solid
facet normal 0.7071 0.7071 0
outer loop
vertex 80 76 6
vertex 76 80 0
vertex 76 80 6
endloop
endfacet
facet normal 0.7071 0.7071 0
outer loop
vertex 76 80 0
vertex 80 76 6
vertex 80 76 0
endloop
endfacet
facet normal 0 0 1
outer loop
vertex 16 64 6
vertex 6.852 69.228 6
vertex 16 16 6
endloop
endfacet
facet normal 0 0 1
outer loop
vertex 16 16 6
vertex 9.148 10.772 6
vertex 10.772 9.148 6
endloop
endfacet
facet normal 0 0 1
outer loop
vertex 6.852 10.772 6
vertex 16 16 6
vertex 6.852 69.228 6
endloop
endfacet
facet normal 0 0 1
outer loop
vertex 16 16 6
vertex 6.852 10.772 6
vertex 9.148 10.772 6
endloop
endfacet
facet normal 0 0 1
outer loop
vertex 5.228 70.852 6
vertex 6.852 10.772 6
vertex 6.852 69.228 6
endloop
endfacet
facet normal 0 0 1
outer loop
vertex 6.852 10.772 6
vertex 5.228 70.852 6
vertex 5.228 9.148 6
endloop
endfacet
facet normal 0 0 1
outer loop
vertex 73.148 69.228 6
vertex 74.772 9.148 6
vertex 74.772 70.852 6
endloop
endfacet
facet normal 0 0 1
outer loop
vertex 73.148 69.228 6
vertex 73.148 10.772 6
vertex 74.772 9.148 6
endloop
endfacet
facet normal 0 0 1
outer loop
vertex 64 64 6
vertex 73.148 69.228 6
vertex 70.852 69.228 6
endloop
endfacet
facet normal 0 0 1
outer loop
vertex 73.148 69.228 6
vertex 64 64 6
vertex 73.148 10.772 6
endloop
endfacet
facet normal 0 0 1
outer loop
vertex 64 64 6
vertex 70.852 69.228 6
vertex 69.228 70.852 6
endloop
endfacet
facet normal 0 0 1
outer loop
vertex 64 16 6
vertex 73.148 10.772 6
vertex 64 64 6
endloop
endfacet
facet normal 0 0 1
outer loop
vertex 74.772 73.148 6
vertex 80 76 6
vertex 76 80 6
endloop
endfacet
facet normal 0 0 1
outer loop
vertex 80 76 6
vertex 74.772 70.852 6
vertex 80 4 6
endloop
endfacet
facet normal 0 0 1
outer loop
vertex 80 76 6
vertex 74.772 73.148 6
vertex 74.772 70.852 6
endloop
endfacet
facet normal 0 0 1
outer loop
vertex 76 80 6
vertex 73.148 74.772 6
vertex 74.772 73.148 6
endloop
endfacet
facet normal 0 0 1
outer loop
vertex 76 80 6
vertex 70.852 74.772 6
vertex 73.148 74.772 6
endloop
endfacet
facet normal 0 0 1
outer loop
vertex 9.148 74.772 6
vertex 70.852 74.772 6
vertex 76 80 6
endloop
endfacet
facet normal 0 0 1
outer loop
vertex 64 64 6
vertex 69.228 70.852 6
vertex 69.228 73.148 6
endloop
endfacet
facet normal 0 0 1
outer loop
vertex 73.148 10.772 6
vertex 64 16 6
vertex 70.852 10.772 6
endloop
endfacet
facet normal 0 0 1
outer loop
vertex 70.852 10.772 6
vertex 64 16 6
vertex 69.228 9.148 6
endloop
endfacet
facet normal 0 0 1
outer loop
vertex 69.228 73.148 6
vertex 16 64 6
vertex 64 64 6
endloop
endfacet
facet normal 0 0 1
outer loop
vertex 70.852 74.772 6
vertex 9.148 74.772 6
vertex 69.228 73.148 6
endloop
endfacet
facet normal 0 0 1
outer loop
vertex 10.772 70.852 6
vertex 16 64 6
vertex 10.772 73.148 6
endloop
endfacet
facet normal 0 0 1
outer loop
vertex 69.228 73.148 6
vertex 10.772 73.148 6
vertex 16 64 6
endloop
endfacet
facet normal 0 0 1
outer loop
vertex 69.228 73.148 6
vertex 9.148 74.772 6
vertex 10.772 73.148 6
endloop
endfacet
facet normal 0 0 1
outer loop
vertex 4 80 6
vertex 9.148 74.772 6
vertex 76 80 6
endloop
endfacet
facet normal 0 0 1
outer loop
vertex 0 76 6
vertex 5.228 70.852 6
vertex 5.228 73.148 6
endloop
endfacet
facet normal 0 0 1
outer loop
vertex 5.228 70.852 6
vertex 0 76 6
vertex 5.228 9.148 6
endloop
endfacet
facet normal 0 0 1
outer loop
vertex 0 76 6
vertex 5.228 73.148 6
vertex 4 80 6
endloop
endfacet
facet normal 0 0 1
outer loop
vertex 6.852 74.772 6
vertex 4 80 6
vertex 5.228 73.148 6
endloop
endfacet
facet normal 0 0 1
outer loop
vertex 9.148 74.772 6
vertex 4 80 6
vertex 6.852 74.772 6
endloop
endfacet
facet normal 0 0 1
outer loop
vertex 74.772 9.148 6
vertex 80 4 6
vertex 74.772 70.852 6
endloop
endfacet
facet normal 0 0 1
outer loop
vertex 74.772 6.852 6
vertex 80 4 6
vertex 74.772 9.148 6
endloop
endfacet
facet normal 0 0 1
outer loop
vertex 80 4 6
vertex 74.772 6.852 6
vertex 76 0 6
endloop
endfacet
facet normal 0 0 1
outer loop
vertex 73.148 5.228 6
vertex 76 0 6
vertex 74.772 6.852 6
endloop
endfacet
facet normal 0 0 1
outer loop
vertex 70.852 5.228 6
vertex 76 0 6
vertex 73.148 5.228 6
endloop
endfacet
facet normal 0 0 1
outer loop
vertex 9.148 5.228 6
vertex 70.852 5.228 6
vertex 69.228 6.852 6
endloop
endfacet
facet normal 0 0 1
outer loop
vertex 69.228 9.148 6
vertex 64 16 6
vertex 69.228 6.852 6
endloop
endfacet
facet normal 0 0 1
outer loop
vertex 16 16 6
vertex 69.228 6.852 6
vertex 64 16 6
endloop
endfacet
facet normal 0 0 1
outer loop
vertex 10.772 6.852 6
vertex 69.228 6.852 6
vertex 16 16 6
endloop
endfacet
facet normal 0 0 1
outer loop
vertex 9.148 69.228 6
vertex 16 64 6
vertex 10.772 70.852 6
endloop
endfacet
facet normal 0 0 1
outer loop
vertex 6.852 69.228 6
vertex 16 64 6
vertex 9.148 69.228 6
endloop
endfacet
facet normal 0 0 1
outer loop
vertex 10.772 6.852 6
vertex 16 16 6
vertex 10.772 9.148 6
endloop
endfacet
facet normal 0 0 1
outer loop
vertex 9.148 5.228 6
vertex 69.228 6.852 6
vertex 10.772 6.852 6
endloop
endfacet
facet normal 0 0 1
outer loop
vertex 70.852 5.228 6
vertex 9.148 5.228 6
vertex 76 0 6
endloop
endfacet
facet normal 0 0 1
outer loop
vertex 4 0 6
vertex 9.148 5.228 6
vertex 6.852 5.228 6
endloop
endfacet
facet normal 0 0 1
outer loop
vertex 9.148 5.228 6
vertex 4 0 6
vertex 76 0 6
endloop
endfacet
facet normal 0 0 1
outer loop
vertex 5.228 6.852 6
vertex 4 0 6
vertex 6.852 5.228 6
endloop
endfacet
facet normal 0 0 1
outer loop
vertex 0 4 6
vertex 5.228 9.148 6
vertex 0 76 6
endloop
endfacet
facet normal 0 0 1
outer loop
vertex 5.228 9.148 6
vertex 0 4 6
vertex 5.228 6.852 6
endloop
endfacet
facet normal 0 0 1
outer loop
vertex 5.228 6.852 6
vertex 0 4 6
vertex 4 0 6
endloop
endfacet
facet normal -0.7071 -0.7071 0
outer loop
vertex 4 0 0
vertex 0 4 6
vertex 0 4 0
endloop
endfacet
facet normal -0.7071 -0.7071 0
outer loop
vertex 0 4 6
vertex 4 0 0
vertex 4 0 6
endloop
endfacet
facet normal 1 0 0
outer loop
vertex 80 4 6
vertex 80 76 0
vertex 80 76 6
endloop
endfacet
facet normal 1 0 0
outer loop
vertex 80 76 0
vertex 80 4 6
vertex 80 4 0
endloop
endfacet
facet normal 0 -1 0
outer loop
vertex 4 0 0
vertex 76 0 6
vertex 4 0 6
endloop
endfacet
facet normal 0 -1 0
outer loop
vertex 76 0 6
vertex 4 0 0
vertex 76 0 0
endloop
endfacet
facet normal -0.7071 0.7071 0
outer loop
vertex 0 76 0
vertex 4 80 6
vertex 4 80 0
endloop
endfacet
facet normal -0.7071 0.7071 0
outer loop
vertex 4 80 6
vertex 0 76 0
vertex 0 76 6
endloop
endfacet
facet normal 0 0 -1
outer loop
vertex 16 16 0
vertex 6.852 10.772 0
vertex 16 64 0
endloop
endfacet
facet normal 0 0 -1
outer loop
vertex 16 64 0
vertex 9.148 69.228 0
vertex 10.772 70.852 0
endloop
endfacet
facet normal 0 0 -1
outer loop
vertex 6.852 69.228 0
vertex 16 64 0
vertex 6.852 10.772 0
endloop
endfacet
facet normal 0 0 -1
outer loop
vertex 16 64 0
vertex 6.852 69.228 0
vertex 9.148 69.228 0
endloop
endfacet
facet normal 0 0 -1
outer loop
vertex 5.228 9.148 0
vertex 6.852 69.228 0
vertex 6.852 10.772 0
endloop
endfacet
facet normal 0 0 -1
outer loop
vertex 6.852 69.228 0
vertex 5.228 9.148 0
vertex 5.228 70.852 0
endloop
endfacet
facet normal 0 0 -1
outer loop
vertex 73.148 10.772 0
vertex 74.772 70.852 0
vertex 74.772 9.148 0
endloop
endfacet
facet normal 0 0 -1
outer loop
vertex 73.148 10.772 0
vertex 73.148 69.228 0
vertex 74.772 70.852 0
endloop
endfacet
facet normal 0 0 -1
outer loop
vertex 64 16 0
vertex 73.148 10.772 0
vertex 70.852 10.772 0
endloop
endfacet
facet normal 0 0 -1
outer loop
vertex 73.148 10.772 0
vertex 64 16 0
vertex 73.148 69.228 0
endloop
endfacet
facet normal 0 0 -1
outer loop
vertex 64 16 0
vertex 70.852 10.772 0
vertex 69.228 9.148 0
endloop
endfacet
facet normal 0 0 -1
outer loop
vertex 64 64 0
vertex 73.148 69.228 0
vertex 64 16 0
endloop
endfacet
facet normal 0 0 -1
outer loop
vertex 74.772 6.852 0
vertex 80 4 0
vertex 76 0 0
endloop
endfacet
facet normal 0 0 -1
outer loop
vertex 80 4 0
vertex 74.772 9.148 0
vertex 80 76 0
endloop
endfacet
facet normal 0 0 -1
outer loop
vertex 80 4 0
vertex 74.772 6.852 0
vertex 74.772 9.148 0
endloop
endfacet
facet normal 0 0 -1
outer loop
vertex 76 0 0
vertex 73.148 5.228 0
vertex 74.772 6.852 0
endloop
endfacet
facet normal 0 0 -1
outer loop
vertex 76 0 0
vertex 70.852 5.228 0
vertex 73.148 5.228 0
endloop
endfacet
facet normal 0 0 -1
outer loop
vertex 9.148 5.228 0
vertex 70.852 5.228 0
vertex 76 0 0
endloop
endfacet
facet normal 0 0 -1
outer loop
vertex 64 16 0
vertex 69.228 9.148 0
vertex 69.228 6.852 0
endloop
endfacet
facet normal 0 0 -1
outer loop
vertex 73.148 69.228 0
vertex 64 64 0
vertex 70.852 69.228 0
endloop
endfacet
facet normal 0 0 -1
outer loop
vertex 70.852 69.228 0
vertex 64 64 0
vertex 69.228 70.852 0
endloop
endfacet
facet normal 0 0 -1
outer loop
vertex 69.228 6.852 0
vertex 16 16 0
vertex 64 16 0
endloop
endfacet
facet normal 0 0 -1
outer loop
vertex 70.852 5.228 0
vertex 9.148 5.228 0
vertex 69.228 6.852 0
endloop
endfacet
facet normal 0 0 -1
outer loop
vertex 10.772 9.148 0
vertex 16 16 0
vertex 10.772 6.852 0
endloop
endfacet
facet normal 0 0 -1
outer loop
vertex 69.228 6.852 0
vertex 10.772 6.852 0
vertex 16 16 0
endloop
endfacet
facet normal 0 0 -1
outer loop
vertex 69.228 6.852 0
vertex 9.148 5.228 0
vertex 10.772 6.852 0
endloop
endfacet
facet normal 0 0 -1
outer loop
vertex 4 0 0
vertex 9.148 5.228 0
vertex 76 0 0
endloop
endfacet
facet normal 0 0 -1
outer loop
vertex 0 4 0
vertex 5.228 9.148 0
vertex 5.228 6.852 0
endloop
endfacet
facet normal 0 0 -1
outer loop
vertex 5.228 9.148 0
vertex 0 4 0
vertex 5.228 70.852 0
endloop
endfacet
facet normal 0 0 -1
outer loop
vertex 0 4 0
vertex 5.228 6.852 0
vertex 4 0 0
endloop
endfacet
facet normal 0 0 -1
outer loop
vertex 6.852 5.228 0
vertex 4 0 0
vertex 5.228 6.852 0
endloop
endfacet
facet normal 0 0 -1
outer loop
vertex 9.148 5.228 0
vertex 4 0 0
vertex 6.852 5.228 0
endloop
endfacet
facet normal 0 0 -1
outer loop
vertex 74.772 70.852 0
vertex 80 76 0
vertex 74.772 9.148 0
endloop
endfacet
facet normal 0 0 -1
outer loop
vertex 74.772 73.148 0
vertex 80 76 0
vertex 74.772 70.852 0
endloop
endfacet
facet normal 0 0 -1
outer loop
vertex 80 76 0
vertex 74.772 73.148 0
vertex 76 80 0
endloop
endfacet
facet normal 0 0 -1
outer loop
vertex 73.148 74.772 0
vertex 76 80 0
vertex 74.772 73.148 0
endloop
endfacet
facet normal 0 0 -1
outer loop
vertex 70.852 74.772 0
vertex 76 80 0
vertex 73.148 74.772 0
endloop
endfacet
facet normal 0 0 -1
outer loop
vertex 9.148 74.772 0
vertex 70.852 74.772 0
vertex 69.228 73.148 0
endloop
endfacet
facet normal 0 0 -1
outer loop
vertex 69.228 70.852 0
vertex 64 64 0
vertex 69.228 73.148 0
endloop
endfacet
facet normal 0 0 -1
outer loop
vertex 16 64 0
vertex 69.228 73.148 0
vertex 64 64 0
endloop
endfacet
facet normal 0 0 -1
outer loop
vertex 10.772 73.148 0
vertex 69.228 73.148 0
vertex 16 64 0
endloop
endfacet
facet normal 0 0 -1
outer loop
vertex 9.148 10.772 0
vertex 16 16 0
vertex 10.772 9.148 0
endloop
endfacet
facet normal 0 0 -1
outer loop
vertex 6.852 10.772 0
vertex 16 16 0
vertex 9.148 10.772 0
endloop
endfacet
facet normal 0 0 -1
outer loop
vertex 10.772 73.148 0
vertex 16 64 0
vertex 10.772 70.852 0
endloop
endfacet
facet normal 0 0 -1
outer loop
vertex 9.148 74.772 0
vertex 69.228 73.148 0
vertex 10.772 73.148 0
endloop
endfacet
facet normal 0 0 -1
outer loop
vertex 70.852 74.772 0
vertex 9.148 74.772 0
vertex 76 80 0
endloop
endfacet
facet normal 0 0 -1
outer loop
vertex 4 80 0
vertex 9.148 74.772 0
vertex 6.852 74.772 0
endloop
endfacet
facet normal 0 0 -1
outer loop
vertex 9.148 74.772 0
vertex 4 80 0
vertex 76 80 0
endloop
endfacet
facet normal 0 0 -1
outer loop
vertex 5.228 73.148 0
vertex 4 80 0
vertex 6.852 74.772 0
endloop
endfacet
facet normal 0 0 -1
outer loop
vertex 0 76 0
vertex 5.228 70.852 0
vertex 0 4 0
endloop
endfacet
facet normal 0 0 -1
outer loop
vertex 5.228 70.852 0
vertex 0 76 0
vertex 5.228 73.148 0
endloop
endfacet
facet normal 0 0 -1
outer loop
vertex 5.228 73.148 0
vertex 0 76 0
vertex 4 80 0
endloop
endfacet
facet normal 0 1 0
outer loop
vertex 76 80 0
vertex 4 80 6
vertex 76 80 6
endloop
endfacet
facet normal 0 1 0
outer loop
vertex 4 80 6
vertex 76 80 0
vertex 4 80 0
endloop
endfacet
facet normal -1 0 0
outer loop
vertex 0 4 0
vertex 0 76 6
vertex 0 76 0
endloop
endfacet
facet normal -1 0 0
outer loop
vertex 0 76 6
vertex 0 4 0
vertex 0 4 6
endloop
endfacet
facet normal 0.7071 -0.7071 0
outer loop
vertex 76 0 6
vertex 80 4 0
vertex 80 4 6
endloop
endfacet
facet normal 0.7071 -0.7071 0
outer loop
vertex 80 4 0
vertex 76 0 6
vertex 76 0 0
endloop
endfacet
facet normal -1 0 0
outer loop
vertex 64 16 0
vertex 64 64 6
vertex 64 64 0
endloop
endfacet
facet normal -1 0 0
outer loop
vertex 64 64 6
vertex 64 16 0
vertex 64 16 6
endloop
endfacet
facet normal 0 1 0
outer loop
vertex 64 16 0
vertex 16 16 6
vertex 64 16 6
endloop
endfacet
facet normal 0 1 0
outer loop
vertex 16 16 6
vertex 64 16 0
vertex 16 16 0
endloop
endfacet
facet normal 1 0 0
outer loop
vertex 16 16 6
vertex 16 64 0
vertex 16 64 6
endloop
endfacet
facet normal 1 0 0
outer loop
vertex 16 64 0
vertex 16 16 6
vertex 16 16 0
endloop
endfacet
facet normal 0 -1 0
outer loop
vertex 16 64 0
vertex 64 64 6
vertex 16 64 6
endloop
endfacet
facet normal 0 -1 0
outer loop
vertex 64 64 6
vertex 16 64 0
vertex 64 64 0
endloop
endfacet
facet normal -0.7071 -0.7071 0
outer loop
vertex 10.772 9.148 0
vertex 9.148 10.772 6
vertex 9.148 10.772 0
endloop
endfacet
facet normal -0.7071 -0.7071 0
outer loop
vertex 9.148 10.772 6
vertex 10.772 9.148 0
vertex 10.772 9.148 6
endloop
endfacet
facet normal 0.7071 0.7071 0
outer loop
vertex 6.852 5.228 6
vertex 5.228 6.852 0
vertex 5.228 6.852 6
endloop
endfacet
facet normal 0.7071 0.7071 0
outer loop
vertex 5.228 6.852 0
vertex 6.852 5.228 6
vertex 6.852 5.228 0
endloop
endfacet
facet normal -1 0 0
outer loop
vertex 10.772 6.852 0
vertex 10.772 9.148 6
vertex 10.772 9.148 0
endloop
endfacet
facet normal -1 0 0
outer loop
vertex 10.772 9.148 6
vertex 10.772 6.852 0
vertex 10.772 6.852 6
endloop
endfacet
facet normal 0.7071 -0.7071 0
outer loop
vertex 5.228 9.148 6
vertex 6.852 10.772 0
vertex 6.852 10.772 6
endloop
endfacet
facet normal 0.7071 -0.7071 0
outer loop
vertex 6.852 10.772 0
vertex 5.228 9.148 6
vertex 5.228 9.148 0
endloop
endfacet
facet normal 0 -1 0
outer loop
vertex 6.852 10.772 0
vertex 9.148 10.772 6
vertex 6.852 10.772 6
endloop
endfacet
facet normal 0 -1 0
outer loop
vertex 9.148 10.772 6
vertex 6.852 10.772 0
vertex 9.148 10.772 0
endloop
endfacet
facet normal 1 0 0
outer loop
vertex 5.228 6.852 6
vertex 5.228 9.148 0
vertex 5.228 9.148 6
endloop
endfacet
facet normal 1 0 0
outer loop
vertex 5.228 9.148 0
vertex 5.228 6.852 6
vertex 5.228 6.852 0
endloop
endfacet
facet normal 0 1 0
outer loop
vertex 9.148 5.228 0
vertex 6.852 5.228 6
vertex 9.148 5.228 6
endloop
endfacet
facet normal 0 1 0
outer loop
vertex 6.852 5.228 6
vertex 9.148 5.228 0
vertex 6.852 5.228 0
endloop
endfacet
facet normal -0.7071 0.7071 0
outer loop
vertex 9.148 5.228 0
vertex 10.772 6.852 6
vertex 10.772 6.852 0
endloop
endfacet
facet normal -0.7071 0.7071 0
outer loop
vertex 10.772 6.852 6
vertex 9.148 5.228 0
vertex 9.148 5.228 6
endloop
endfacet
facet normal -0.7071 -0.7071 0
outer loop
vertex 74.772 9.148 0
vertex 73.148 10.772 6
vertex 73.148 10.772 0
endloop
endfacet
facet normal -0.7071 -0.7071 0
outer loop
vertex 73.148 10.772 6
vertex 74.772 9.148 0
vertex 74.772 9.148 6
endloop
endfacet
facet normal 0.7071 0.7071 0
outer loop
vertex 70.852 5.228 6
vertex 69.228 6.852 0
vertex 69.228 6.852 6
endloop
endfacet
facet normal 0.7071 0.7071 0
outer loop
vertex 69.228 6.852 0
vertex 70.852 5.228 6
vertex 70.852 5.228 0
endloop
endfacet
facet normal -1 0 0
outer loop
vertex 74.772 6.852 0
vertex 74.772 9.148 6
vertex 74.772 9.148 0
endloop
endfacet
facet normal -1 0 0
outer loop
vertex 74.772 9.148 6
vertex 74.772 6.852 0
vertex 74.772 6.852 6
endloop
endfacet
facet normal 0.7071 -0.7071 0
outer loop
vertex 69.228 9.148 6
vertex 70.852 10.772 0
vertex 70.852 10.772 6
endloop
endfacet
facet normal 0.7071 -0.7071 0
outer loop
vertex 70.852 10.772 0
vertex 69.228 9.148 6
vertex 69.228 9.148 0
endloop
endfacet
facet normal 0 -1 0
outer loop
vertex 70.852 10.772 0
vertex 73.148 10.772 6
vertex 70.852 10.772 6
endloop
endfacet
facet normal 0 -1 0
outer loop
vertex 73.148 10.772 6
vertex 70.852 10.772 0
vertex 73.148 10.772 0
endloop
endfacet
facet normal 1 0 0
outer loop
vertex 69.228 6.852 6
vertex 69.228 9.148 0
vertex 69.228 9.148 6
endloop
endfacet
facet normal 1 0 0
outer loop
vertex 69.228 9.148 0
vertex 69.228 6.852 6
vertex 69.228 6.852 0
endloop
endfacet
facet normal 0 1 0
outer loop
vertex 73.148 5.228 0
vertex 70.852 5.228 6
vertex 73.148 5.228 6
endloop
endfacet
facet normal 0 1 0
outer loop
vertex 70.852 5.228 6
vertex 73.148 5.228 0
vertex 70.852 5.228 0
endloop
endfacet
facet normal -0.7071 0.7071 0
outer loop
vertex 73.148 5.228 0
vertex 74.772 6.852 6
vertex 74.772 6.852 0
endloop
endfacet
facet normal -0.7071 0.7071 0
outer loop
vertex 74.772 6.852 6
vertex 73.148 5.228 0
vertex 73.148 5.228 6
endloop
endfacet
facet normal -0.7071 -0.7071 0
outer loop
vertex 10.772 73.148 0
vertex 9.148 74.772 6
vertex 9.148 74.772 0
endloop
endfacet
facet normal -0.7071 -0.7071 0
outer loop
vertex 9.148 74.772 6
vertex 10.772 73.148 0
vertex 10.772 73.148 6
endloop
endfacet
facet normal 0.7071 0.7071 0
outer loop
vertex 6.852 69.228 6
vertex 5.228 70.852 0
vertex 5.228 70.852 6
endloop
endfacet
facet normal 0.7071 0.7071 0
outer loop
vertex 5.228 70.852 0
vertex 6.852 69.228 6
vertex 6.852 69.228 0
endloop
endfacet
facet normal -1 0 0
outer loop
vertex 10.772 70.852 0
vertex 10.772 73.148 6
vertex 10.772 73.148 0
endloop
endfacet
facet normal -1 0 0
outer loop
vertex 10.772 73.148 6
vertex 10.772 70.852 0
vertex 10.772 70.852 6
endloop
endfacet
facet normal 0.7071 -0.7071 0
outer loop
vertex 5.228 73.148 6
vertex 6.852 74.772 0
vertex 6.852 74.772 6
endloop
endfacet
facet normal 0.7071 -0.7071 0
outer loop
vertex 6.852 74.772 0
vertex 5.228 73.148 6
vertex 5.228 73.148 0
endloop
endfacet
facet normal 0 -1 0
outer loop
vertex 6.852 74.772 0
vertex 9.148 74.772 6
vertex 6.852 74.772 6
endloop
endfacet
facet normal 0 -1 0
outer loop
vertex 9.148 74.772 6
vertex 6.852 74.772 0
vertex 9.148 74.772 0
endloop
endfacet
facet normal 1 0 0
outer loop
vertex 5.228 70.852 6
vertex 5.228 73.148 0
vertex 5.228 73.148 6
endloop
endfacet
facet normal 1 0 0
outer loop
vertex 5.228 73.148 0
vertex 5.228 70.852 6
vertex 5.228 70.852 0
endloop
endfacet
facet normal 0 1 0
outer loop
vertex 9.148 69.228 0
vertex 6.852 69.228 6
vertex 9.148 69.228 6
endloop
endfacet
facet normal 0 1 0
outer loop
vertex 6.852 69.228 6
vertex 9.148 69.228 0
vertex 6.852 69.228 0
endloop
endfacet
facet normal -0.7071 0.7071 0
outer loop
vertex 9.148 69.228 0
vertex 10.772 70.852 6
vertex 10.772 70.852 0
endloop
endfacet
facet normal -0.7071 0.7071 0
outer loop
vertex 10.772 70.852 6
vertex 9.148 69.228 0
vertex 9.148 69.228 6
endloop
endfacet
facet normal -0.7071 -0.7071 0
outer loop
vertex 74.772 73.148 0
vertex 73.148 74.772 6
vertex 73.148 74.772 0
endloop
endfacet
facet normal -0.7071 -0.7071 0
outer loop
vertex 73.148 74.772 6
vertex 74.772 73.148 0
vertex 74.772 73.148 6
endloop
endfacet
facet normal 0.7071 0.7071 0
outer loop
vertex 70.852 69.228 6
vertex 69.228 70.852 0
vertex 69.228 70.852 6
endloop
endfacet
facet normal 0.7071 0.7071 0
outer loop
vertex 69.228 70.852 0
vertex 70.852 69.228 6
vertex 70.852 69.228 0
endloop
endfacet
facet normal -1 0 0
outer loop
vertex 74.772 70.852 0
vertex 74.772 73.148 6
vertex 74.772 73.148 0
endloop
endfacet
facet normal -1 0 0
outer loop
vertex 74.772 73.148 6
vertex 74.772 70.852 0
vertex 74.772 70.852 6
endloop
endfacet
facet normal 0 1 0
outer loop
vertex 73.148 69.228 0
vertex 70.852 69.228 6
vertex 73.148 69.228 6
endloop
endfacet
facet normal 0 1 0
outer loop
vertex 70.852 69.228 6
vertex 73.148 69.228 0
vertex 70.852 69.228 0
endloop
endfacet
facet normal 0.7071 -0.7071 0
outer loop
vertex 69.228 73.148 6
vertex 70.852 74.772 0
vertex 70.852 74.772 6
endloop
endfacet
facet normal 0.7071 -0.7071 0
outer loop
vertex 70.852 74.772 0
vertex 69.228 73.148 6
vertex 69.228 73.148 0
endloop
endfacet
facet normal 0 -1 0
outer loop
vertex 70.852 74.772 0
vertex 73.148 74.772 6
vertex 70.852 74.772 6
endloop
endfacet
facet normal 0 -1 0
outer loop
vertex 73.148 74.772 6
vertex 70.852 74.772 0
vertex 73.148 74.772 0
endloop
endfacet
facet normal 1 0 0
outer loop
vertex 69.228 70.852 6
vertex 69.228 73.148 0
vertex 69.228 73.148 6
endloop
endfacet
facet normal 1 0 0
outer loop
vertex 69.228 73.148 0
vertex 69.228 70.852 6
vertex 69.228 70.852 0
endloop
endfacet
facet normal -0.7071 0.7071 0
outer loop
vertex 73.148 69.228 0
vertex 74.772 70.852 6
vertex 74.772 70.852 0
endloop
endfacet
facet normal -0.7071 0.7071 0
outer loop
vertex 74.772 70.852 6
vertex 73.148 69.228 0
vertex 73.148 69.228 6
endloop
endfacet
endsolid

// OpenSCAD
$fn = 32;

// ----------------------------------------------------------------------
// Frame plate: 80 x 80 frame, 16 mm rails
// ----------------------------------------------------------------------

// --- parameters (mm) ---
plate_l = 80;             // plate length, X
plate_w = 80;             // plate width, Y
plate_t = 6;              // plate thickness, Z (extrusion height)
corner_c = 4;             // corner chamfer
frame_bar = 16;           // frame rail width
bolt_r = 3;               // corner bolt window radius
bolt_inset = 8;           // bolt centre inset from the edges
fit_tol = 0.05;           // declared fit tolerance (prompt contract)
free_tol = 0.3;           // declared free tolerance (prompt contract)

win_l = plate_l - 2 * frame_bar;  // window length
win_w = plate_w - 2 * frame_bar;  // window width
bolt_d = 2 * bolt_r;  // corner hole diameter

profile = [[4, 0], [76, 0], [80, 4], [80, 76], [76, 80], [4, 80], [0, 76], [0, 4]];  // primary outline, 8 points, counter clockwise
void_1 = [[16, 16], [64, 16], [64, 64], [16, 64]];  // the window, 4 points
void_2 = [[10.772, 9.148], [9.148, 10.772], [6.852, 10.772], [5.228, 9.148], [5.228, 6.852], [6.852, 5.228], [9.148, 5.228], [10.772, 6.852]];  // corner bolt window, 8 points
void_3 = [[74.772, 9.148], [73.148, 10.772], [70.852, 10.772], [69.228, 9.148], [69.228, 6.852], [70.852, 5.228], [73.148, 5.228], [74.772, 6.852]];  // corner bolt window, 8 points
void_4 = [[10.772, 73.148], [9.148, 74.772], [6.852, 74.772], [5.228, 73.148], [5.228, 70.852], [6.852, 69.228], [9.148, 69.228], [10.772, 70.852]];  // corner bolt window, 8 points
void_5 = [[74.772, 73.148], [73.148, 74.772], [70.852, 74.772], [69.228, 73.148], [69.228, 70.852], [70.852, 69.228], [73.148, 69.228], [74.772, 70.852]];  // corner bolt window, 8 points

// --- the one profile operation ---
difference() {
  linear_extrude(height = plate_t) polygon(points = profile);
  translate([0, 0, -1])
    linear_extrude(height = plate_t + 2) polygon(points = void_1);
  translate([0, 0, -1])
    linear_extrude(height = plate_t + 2) polygon(points = void_2);
  translate([0, 0, -1])
    linear_extrude(height = plate_t + 2) polygon(points = void_3);
  translate([0, 0, -1])
    linear_extrude(height = plate_t + 2) polygon(points = void_4);
  translate([0, 0, -1])
    linear_extrude(height = plate_t + 2) polygon(points = void_5);
}
